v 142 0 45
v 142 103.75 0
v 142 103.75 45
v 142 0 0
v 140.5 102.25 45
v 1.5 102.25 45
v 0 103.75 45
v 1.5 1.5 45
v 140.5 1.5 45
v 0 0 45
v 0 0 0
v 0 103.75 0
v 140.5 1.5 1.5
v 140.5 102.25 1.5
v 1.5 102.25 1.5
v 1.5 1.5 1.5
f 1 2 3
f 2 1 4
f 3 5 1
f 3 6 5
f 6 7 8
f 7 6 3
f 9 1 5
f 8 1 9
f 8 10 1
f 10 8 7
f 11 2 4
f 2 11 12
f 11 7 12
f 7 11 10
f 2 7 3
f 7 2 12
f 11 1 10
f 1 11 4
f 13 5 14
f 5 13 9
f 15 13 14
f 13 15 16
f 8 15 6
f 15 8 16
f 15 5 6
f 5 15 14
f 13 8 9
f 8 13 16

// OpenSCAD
x=294;
y=425;
z=50;

//cube([x,y,z]);

x_use = x-10;
y_use=y-10;
z_use=z-5;

total_x = 6;
total_y=8;
thickness = 1.5;
z_thickness=1.5;


module piece(x_span=1,y_span=1){
    
    x_width = x_span * (x_use/total_x);
    
    y_width = y_span * (y_use/total_y);
    difference(){
        
    cube([x_width,y_width,z_use]);
        translate([thickness,thickness,z_thickness])
        cube([x_width-thickness*2,y_width-thickness*2,z_use]);
        
    }
    
    
};

piece(3,2);
